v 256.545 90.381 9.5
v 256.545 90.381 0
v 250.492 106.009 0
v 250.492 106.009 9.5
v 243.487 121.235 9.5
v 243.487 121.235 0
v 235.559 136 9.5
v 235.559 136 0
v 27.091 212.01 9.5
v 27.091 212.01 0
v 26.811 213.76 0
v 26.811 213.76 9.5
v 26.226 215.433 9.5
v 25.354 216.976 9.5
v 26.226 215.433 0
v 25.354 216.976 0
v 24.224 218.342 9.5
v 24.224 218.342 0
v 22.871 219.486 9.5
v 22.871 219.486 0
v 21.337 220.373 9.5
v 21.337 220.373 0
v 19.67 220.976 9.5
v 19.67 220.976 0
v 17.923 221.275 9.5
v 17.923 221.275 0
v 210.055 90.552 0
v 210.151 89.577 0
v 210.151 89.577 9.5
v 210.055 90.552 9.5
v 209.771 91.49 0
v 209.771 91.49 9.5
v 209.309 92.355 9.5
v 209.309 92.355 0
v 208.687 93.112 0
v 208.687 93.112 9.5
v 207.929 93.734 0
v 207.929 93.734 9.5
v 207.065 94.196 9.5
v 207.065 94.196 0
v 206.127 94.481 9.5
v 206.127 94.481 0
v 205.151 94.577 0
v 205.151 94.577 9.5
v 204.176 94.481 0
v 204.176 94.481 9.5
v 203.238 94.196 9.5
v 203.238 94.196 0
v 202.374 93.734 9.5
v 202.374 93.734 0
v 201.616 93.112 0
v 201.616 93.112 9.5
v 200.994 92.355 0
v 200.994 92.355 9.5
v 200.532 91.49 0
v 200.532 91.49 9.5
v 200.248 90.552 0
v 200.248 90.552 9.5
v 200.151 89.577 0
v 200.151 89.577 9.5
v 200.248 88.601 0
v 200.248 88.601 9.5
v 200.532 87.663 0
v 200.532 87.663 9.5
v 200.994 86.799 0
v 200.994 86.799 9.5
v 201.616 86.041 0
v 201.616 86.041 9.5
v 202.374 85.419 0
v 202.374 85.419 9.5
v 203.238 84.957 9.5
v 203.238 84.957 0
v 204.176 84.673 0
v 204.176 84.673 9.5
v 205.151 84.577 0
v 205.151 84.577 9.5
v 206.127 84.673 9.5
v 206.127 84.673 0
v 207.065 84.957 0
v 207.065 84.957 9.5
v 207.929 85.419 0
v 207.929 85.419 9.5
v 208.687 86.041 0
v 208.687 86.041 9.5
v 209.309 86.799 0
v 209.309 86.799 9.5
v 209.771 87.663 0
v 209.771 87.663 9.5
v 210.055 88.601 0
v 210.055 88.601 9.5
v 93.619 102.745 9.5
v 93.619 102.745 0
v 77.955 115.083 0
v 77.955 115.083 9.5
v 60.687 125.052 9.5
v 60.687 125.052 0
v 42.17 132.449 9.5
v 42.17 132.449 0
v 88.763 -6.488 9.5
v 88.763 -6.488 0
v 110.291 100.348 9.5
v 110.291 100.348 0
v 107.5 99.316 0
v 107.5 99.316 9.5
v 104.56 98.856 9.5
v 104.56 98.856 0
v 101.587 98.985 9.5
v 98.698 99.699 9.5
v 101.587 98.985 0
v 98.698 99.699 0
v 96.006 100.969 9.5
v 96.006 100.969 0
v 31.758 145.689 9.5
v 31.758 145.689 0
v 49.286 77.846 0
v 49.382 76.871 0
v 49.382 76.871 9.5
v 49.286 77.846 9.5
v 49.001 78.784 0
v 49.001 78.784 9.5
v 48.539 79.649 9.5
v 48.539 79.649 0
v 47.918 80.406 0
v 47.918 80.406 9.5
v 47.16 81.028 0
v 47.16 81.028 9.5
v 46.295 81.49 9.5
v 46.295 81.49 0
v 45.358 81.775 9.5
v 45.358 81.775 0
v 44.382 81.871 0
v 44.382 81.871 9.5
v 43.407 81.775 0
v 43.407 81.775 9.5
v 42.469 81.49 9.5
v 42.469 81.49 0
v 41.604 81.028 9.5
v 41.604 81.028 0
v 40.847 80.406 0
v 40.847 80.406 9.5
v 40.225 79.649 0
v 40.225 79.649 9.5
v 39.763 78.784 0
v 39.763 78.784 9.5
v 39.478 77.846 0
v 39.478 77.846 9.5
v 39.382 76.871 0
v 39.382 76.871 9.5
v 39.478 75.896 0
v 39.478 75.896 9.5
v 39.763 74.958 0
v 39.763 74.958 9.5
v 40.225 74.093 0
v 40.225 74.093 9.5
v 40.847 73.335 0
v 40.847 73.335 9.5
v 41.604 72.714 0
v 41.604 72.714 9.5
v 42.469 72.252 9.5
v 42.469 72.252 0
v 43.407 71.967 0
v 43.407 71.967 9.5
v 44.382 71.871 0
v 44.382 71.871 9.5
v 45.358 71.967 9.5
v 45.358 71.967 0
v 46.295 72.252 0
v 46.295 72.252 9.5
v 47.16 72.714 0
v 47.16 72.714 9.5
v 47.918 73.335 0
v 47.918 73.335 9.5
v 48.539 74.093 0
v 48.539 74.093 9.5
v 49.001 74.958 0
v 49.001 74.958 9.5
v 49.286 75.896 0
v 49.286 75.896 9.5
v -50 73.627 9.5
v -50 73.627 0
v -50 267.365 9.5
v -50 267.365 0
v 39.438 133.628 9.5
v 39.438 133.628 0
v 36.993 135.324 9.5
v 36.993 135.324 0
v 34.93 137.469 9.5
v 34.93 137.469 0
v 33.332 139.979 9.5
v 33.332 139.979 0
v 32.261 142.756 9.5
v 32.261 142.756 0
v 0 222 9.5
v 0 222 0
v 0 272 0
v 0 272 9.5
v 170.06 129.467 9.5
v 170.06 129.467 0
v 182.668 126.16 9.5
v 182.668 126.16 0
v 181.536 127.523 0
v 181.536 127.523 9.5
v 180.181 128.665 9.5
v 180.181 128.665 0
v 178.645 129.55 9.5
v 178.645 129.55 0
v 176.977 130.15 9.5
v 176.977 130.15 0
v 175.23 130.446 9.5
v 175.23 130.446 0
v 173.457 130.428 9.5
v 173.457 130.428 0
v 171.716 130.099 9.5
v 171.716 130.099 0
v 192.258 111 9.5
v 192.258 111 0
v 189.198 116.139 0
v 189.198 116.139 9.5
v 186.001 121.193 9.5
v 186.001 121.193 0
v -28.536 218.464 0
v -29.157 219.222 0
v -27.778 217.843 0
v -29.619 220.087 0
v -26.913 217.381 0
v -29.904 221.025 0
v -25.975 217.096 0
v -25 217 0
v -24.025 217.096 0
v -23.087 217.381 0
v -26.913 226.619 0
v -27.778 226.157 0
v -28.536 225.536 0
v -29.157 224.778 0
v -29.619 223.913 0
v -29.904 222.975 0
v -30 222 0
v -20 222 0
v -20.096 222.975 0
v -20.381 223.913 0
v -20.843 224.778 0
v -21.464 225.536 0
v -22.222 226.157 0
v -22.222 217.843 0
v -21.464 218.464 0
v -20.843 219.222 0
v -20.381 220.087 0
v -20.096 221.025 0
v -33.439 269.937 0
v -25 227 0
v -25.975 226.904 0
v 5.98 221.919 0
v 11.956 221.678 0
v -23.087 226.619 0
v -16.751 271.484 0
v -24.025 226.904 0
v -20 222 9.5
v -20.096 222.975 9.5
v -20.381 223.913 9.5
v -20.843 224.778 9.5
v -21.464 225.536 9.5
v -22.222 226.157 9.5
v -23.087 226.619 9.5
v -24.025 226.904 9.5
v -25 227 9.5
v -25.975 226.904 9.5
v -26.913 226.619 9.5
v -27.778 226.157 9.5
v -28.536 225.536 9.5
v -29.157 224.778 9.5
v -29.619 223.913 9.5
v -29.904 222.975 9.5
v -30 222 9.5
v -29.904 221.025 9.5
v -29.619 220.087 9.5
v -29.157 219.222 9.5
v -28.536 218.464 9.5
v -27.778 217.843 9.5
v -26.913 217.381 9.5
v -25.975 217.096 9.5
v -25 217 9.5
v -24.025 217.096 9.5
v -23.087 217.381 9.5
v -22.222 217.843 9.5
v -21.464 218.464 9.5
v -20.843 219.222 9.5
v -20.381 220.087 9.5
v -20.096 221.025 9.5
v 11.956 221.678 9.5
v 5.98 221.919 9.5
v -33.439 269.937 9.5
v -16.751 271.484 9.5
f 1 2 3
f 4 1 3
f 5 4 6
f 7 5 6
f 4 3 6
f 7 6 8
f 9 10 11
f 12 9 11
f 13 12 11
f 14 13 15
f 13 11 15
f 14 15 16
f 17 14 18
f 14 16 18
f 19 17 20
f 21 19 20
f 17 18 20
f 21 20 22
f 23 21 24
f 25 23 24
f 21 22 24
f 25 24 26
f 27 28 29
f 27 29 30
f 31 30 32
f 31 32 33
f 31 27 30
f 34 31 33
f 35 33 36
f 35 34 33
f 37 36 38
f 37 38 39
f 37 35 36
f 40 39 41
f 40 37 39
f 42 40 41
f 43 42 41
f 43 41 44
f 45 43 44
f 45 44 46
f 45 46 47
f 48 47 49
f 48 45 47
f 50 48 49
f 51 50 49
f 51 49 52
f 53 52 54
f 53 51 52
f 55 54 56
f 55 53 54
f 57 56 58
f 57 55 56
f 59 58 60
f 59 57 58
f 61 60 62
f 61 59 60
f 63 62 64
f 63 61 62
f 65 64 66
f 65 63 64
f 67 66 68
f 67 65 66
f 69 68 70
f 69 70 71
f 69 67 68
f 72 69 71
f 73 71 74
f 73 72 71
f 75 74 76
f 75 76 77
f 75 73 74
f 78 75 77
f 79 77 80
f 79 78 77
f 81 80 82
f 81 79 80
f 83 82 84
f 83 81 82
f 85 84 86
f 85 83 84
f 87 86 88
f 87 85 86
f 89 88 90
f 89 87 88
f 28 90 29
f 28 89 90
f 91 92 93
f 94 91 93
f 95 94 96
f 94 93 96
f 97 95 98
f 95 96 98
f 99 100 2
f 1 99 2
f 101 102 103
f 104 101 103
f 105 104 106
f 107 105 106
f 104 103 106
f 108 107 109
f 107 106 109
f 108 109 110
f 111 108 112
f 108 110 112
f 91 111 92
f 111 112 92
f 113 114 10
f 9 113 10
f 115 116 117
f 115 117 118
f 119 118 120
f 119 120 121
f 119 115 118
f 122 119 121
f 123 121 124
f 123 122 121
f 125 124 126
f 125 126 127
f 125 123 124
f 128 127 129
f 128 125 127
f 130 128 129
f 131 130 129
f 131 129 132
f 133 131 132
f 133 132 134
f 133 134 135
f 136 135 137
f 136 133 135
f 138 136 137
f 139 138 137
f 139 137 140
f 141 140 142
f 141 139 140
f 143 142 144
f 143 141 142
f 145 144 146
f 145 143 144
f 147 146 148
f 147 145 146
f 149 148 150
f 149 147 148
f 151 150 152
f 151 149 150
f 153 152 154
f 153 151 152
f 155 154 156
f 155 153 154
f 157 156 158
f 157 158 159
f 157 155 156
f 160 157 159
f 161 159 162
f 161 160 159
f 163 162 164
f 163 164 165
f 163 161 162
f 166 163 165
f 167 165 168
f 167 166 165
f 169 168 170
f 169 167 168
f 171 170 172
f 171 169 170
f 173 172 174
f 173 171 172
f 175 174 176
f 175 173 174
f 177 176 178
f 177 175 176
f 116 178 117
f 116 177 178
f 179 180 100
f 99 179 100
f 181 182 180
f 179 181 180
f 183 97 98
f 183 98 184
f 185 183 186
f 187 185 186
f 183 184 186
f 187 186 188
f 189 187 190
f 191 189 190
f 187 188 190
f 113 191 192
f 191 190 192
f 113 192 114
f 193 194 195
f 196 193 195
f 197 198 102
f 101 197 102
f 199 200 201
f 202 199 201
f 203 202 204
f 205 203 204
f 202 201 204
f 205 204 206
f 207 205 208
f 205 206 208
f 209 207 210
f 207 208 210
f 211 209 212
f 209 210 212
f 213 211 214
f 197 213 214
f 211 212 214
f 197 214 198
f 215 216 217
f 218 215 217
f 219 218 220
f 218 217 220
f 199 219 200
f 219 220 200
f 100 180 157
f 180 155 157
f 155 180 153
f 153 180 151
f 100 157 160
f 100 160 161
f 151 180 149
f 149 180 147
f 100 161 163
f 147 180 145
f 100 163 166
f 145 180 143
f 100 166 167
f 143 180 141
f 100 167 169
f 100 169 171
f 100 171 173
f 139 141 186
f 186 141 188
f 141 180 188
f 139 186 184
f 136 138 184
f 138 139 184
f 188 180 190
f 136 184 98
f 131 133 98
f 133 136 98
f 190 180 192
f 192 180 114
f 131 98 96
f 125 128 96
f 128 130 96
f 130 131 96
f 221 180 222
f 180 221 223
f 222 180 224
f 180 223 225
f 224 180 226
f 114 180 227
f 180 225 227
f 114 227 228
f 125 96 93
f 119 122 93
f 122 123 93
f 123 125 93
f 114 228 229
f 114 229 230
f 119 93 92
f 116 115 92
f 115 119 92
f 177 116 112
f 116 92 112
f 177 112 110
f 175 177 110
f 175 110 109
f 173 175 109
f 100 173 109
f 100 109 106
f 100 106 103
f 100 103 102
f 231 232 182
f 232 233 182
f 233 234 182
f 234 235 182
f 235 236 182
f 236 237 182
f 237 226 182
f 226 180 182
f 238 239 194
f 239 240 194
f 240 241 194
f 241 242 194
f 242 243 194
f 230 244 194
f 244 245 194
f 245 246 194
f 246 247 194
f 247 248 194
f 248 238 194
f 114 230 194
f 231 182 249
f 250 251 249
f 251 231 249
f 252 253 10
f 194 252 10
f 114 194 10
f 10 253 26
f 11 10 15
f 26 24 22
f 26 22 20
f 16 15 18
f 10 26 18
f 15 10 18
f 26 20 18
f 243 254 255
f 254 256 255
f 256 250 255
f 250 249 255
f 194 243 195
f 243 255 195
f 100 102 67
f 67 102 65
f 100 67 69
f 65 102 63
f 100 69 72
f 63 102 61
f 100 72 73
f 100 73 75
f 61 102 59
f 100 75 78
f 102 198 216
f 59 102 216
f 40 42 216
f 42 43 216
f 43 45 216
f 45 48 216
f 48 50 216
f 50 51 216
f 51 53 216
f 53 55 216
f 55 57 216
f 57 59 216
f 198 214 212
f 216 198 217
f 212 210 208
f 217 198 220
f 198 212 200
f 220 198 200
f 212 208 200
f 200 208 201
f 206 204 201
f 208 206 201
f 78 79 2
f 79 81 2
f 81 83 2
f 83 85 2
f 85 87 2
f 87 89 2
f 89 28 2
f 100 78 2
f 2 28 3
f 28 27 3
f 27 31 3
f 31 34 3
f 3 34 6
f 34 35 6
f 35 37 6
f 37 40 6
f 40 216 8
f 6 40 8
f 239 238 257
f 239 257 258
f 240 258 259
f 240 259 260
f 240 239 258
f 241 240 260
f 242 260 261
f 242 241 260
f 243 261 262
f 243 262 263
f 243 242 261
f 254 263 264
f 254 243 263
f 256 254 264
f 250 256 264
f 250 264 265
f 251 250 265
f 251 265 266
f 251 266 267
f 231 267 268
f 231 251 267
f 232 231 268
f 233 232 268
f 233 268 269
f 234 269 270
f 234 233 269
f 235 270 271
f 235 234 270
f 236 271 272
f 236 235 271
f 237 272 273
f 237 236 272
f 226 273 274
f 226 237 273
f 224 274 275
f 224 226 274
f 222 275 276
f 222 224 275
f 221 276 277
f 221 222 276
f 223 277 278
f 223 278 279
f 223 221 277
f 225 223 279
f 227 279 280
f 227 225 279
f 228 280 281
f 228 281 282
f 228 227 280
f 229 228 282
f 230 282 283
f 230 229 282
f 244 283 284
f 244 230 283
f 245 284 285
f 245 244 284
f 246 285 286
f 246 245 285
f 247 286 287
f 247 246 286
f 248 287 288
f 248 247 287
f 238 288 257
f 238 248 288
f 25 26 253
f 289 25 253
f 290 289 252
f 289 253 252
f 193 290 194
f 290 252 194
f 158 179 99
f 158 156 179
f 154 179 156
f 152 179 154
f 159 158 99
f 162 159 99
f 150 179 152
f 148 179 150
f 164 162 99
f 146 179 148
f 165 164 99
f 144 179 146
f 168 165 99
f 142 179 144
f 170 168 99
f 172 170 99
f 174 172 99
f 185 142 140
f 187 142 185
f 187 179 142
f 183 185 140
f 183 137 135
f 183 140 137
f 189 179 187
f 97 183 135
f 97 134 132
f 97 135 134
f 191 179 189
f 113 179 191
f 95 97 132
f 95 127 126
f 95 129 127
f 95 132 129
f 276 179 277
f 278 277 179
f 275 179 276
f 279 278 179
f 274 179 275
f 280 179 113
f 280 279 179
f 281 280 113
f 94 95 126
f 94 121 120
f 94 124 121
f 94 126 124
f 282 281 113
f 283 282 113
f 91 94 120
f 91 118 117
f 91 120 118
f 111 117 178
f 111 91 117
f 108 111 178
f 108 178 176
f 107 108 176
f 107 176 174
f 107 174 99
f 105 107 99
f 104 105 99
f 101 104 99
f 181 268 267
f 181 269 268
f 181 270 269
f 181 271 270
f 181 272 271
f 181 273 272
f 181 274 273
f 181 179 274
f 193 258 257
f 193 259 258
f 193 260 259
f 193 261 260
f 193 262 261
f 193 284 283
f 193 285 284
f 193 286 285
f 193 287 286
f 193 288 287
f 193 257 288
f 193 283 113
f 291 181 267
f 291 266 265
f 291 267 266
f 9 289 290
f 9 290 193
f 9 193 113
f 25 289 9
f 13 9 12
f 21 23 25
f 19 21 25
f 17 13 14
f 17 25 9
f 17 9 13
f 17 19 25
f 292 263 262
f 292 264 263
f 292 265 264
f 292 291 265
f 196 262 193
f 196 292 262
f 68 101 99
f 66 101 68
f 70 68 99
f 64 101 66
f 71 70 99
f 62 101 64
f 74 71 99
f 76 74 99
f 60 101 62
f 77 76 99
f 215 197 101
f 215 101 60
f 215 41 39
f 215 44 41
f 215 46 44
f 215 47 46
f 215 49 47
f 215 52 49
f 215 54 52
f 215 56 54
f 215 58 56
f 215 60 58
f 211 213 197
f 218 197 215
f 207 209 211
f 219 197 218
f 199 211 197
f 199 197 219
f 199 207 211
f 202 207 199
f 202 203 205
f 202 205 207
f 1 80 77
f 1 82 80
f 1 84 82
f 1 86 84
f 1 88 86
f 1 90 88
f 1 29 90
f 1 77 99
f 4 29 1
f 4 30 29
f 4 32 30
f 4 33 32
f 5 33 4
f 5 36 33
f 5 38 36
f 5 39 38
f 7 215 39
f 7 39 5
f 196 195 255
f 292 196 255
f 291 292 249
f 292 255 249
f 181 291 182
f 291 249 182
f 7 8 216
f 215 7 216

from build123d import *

# Parameters (mm, degrees)
F0_R     = 5
F1_DEPTH = 9.5


with BuildPart() as f1:
    # F0 (on Top) → F1 (new body)
    with BuildSketch(Plane.XY):
        with BuildLine():
            ThreePointArc((27.091291, 212.009885), (24.224301, 218.341531), (17.923315, 221.275292))
            ThreePointArc((17.923315, 221.275292), (8.96898, 221.818749), (0, 222))
            Line((0, 222), (0, 272))
            ThreePointArc((0, 272), (-25.10719, 270.838751), (-50, 267.364919))
            Line((-50, 267.364919), (-50, 73.627441))
            Line((-50, 73.627441), (88.763234, -6.48755))
            Line((88.763234, -6.48755), (256.544812, 90.381189))
            ThreePointArc((256.544812, 90.381189), (247.106834, 113.675911), (235.55891, 136))
            Line((235.55891, 136), (192.25764, 111))
            ThreePointArc((192.25764, 111), (187.616182, 118.676739), (182.668367, 126.159692))
            ThreePointArc((182.668367, 126.159692), (176.977162, 130.149626), (170.0603, 129.466689))
            Line((170.0603, 129.466689), (110.29109, 100.347803))
            ThreePointArc((110.29109, 100.347803), (101.586655, 98.98529), (93.61871, 102.745011))
            ThreePointArc((93.61871, 102.745011), (69.5, 120.377531), (42.170434, 132.448686))
            ThreePointArc((42.170434, 132.448686), (34.930449, 137.469269), (31.758201, 145.688787))
            Line((31.758201, 145.688787), (27.091291, 212.009885))
        make_face()
        with Locations((44.382053, 76.870964)):
            Circle(F0_R, mode=Mode.SUBTRACT)
        with Locations((205.15145, 89.576731)):
            Circle(F0_R, mode=Mode.SUBTRACT)
        with Locations((-25, 222)):
            Circle(F0_R, mode=Mode.SUBTRACT)
    extrude(amount=F1_DEPTH)


solid = f1.part
